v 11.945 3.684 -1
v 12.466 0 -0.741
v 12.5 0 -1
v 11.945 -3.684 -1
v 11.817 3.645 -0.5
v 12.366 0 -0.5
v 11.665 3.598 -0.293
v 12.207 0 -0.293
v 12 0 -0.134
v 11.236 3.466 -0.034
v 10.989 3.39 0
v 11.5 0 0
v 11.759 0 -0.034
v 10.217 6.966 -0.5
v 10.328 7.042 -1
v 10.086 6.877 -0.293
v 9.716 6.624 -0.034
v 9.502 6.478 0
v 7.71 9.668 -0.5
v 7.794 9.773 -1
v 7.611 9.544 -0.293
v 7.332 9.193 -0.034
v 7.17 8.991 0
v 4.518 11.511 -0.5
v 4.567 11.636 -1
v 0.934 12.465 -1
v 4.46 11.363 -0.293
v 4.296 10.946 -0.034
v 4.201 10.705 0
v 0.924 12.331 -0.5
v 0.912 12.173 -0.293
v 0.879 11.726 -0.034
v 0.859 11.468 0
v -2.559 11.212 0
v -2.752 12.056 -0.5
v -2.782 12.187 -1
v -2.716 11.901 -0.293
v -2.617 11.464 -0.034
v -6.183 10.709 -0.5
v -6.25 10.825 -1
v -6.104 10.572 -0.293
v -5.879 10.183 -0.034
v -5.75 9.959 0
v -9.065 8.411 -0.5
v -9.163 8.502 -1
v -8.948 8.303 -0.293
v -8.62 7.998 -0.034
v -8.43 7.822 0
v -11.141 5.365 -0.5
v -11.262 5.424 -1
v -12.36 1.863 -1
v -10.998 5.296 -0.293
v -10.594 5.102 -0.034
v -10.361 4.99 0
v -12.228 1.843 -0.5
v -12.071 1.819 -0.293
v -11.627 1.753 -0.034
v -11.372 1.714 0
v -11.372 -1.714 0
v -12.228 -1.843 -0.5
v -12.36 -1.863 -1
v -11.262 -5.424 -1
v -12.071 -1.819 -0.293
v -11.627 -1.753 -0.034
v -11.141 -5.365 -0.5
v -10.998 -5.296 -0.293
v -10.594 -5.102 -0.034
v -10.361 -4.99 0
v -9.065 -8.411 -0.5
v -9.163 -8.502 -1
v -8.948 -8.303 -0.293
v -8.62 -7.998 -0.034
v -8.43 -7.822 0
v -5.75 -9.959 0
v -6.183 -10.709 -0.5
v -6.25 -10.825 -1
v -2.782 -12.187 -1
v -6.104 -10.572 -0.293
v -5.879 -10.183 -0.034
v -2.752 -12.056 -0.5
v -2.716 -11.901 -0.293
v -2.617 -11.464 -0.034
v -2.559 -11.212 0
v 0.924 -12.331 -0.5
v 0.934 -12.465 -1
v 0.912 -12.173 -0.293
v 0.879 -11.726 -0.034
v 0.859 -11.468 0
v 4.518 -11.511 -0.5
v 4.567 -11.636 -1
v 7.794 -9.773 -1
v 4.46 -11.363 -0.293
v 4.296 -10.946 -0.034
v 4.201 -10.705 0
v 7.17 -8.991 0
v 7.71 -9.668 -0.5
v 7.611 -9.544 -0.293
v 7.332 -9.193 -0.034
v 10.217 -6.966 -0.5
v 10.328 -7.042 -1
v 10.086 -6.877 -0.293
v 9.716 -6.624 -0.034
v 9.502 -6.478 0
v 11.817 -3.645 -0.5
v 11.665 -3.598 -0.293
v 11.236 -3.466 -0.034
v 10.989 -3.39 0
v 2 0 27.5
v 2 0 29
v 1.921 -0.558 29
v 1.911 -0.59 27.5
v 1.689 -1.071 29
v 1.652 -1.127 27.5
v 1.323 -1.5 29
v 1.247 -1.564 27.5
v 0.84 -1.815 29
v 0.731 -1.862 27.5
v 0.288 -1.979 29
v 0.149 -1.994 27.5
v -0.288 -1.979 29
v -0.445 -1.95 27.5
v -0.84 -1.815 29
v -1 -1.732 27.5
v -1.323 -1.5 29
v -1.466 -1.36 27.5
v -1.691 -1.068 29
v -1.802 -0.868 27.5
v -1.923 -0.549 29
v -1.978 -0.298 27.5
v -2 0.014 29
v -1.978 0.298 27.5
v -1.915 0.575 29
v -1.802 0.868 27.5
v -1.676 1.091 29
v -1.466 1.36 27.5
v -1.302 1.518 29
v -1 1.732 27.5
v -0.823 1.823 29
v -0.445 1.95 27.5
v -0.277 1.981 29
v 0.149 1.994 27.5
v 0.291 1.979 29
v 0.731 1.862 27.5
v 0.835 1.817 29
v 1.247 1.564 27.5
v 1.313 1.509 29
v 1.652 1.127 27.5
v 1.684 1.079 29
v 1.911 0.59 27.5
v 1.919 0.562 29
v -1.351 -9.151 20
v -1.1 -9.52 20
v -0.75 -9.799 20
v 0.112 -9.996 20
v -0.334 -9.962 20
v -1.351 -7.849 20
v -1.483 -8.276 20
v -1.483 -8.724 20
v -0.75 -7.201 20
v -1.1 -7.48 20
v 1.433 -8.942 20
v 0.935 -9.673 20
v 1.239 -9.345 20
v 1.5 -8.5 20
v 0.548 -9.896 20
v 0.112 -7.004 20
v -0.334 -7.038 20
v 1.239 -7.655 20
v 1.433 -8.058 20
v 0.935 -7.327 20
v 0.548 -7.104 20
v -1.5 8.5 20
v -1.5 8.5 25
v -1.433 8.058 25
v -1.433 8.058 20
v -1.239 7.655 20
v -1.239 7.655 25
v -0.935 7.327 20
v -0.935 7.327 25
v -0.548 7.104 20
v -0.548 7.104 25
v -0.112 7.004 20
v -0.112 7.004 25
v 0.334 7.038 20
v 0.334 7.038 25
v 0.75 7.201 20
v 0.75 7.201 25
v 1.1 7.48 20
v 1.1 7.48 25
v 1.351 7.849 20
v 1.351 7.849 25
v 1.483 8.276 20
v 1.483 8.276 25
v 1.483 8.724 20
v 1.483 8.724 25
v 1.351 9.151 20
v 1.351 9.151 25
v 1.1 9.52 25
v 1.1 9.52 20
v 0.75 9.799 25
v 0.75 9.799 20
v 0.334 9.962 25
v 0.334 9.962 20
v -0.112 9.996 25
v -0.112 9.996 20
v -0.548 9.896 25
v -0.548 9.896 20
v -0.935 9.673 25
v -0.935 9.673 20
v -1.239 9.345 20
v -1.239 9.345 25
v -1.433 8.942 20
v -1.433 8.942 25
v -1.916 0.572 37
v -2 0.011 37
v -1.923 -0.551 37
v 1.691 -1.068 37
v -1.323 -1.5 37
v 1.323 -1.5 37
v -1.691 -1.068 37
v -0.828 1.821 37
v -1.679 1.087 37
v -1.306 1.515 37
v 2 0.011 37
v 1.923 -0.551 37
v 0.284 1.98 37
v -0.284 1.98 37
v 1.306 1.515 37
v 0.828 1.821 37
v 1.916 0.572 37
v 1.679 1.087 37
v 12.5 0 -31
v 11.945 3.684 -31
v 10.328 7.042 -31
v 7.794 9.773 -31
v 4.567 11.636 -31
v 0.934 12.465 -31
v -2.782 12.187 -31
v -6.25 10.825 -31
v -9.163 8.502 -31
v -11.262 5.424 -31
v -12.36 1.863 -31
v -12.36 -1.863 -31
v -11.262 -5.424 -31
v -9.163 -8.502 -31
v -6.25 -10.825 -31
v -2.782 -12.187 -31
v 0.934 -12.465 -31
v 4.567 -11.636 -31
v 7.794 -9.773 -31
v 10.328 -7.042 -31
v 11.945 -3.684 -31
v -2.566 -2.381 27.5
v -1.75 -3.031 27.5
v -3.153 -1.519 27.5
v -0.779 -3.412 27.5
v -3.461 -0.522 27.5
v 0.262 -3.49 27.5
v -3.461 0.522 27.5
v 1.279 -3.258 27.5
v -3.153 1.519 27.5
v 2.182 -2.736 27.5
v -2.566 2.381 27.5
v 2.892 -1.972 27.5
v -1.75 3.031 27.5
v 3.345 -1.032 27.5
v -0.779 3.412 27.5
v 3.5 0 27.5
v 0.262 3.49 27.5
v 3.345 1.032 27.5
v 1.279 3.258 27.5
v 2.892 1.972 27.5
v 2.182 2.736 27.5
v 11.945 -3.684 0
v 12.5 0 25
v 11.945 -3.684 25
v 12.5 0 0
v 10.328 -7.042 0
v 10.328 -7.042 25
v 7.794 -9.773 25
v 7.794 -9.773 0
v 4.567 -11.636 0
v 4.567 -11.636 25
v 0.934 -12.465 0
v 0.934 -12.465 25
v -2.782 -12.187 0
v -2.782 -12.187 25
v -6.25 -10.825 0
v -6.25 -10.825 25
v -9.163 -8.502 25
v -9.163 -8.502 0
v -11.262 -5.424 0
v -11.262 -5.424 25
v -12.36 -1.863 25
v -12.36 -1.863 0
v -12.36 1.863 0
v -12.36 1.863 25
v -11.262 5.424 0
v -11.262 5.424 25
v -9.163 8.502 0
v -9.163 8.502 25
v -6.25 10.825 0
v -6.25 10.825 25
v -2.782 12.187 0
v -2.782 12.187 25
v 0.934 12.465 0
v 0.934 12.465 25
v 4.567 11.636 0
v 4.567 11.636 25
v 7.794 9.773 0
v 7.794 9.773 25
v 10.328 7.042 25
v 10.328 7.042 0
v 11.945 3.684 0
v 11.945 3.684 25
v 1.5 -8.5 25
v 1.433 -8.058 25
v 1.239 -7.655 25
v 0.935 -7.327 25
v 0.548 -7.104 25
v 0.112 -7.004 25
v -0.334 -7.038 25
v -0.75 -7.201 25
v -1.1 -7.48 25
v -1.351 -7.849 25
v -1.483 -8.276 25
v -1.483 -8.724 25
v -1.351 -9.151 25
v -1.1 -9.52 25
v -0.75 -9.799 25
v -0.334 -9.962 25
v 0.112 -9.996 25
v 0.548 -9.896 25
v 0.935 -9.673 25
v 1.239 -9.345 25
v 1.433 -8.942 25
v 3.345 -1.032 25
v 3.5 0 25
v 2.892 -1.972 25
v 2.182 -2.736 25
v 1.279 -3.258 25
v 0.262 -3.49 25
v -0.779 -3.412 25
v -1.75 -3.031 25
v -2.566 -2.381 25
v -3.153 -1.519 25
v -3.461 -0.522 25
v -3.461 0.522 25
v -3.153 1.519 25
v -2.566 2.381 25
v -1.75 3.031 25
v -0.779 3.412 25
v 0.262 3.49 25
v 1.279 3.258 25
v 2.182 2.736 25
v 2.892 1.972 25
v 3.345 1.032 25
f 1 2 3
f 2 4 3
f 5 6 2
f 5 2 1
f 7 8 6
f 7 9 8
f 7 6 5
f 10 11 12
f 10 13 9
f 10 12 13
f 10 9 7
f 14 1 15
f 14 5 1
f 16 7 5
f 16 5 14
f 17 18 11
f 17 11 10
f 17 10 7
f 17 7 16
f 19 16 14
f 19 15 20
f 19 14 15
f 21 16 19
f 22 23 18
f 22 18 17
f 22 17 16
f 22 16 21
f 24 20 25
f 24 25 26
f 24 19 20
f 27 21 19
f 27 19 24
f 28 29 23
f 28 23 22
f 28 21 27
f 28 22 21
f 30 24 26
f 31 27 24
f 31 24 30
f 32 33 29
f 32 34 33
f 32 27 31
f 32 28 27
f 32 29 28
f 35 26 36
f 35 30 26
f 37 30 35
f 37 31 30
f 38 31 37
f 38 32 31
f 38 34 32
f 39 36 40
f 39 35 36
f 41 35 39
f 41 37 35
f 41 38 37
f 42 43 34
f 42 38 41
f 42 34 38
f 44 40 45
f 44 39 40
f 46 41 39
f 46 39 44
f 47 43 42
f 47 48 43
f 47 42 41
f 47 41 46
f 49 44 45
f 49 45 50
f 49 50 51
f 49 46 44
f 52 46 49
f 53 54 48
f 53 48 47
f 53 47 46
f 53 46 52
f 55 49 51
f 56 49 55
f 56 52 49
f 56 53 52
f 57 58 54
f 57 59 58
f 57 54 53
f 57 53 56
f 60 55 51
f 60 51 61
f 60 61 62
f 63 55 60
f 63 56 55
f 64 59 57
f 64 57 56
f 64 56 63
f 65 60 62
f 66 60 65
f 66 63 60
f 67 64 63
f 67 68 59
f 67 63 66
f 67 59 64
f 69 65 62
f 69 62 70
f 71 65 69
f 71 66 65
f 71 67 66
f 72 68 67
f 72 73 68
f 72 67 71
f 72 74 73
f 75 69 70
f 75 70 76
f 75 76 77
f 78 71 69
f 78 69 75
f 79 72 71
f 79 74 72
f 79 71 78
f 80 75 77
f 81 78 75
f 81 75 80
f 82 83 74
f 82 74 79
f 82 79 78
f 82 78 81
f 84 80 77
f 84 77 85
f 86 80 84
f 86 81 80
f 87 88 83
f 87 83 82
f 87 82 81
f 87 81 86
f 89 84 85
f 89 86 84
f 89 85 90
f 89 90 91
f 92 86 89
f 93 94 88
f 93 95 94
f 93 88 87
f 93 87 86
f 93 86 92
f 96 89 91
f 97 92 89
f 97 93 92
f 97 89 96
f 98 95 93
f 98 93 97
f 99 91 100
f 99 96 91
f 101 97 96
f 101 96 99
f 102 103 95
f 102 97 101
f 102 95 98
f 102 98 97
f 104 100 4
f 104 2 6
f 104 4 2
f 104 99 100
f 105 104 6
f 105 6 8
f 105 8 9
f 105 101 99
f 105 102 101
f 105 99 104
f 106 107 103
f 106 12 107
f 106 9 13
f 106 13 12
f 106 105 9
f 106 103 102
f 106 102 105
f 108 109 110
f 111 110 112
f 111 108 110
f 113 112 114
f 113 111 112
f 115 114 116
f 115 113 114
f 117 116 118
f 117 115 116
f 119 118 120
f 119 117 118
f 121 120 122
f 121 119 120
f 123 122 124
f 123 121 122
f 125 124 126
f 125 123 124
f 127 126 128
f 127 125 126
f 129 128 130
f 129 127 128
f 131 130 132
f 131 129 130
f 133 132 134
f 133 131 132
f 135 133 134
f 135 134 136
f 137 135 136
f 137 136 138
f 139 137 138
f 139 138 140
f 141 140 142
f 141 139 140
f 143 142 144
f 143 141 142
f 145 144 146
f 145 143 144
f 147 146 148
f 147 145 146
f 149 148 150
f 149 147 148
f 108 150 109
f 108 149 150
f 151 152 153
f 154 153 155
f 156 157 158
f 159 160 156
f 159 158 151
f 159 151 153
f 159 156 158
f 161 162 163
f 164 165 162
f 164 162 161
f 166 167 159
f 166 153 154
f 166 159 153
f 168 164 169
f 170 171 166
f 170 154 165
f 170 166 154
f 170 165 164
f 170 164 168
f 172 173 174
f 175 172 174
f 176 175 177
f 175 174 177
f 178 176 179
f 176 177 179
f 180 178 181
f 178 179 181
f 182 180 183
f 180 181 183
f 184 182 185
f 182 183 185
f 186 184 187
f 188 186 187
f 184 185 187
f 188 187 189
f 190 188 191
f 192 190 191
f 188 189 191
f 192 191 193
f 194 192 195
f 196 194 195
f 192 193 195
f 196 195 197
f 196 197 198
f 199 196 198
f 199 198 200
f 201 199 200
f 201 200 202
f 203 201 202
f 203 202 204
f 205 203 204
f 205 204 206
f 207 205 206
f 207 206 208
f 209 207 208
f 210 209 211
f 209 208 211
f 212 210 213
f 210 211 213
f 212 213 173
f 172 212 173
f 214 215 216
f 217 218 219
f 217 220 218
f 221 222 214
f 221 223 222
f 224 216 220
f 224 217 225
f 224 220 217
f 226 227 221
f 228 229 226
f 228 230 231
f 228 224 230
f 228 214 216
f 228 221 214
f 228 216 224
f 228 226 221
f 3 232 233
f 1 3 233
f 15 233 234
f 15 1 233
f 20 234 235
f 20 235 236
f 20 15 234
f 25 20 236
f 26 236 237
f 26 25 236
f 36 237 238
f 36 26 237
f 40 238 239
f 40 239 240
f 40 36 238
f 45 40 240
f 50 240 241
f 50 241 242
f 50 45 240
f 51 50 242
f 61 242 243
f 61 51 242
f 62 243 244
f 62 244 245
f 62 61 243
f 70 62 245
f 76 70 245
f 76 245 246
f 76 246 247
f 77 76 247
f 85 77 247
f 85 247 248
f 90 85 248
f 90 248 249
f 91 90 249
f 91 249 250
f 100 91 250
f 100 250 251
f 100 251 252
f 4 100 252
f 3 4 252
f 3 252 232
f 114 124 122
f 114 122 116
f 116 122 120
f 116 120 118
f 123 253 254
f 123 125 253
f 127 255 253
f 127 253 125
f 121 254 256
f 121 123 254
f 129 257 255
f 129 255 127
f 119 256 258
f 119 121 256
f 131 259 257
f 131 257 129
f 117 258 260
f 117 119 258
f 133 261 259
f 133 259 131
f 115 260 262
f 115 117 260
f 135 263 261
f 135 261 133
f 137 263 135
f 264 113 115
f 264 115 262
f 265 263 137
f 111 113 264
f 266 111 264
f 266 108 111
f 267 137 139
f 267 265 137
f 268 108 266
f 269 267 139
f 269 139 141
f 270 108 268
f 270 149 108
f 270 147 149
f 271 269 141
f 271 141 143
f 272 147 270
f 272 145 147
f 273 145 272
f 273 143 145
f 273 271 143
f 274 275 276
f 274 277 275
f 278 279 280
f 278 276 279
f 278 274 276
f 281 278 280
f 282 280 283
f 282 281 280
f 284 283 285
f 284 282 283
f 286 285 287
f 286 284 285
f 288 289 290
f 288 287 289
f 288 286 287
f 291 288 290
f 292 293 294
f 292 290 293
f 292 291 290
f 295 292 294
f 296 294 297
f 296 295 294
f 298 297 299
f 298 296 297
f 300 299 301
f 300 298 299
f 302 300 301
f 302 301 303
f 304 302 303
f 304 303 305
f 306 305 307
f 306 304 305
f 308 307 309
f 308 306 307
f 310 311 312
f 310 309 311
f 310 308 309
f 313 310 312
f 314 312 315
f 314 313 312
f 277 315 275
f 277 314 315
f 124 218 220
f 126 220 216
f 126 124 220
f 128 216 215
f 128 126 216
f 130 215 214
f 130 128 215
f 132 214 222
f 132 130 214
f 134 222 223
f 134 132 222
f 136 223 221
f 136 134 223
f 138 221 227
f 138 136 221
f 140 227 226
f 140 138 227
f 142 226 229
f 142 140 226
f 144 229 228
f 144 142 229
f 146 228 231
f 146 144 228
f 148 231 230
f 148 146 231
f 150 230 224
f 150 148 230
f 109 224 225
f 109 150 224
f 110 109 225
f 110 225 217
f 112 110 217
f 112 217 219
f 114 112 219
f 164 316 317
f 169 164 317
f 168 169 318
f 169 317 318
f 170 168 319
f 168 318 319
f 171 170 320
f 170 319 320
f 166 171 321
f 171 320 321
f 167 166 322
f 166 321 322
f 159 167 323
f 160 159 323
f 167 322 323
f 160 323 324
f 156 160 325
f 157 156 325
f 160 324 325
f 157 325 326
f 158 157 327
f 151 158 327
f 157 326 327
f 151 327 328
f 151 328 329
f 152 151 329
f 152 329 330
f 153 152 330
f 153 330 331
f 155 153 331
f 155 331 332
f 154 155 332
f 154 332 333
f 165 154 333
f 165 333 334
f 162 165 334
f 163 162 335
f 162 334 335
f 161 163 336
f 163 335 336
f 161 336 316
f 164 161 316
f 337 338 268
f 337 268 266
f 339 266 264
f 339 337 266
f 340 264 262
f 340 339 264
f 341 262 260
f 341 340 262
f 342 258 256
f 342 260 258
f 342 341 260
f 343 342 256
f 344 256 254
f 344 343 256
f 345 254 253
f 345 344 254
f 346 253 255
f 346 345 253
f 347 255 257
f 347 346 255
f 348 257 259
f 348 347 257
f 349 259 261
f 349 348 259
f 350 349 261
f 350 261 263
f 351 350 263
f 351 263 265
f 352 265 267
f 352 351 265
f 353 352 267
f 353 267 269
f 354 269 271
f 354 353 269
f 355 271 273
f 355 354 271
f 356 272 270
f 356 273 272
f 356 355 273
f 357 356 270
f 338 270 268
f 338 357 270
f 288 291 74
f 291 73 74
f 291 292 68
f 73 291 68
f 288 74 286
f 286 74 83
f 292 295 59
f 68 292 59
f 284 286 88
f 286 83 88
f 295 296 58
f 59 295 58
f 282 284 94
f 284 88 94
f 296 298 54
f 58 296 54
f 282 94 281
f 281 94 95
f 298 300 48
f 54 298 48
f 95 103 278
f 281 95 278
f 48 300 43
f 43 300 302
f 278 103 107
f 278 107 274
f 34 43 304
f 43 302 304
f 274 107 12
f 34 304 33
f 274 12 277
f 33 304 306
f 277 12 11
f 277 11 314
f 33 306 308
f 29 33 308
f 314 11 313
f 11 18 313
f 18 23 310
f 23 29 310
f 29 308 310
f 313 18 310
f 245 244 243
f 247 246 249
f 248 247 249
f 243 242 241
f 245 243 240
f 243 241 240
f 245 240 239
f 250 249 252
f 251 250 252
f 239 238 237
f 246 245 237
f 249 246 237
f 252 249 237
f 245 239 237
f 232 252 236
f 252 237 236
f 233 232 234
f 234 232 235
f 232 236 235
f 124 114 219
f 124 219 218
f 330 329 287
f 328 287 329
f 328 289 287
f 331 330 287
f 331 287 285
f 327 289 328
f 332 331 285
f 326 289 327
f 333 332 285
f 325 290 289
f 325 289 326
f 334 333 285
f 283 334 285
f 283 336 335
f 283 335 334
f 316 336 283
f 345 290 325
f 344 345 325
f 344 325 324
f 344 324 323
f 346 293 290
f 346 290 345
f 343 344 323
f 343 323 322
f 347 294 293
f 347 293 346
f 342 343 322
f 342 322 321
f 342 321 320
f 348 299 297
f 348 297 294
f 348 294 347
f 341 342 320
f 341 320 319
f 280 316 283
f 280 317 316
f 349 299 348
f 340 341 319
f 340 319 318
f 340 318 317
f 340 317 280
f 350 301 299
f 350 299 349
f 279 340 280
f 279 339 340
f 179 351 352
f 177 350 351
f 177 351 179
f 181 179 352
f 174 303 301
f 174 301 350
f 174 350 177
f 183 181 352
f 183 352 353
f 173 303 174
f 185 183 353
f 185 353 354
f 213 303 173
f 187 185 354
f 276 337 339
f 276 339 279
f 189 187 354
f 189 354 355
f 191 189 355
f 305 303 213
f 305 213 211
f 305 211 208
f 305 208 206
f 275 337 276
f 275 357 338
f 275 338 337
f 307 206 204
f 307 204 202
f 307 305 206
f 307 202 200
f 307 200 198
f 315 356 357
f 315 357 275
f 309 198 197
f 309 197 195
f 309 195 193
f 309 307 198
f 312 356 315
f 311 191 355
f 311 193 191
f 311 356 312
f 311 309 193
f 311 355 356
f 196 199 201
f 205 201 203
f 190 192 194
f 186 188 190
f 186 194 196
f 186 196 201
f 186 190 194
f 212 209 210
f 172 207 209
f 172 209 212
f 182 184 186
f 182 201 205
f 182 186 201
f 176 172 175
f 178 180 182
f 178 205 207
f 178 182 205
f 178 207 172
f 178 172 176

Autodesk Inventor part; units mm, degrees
ref_plane "YZ Plane" through (0, 0, 0) normal (1, 0, 0) x (0, 1, 0)
ref_plane "XZ Plane" through (0, 0, 0) normal (0, 1, 0) x (-1, 0, 0)
ref_plane "XY Plane" through (0, 0, 0) normal (0, 0, 1) x (1, 0, 0)
sketch "Эскиз1" plane through (0, 0, 0) normal (0, 0, 1) x (1, 0, 0)
  circle A0 centre (0, 0) radius 12.5
  dimension "d0" = 25
extrude "Выдавливание1" add sketch "Эскиз1" against normal blind 31
fillet "Сопряжение1" radius 1 1 edges at (-12.5, 0, 0)
sketch "Эскиз2" plane through (0, 0, 0) normal (0, 0, 1) x (1, 0, 0)
  circle A0 centre (0, 0) radius 12.5
  dimension "d4" = 25
extrude "Выдавливание2" add sketch "Эскиз2" along normal blind 25
sketch "Эскиз3" plane through (0, 0, 25) normal (0, 0, 1) x (1, 0, 0)
  circle A0 centre (0, 0) radius 3.5
  dimension "d7" = 7
extrude "Выдавливание3" add sketch "Эскиз3" along normal blind 2.5
sketch "Эскиз4" plane through (0, 0, 27.5) normal (0, 0, 1) x (1, 0, 0)
  circle A0 centre (0, 0) radius 2
  dimension "d10" = 4
extrude "Выдавливание4" add sketch "Эскиз4" along normal blind 1.5
sketch "Эскиз5" plane through (0, 0, 29) normal (0, 0, 1) x (1, 0, 0)
  arc A0 (1.3229, -1.5) -> (-1.3229, -1.5) centre (0, 0) ccw
  line L0 (0, 0) -> (0, 2)
  line L1 (1.3229, -1.5) -> (-1.3229, -1.5)
  circle A1 centre (0, 0) radius 2 projected
  dimension "d14" = 3.5
extrude "Выдавливание5" add sketch "Эскиз5" along normal blind 8 contours L1 A0
sketch "Эскиз6" plane through (0, 0, 25) normal (0, 0, 1) x (1, 0, 0)
  circle A0 centre (0, 0) radius 8.5
  circle A1 centre (0, -8.5) radius 1.5
  dimension "d17" = 17
  dimension "d18" = 3
extrude "Выдавливание6" cut sketch "Эскиз6" against normal blind 5 contours A1 A0 | A0 A1 picked at (0, -7.9902) picked at (0.04, -8.9886)
pattern_circular "Круговой массив1" count 2 over 360 about axis through (0, 0, 0) along (0, 0, 1) of "Выдавливание6"
properties part number "Двигун"
